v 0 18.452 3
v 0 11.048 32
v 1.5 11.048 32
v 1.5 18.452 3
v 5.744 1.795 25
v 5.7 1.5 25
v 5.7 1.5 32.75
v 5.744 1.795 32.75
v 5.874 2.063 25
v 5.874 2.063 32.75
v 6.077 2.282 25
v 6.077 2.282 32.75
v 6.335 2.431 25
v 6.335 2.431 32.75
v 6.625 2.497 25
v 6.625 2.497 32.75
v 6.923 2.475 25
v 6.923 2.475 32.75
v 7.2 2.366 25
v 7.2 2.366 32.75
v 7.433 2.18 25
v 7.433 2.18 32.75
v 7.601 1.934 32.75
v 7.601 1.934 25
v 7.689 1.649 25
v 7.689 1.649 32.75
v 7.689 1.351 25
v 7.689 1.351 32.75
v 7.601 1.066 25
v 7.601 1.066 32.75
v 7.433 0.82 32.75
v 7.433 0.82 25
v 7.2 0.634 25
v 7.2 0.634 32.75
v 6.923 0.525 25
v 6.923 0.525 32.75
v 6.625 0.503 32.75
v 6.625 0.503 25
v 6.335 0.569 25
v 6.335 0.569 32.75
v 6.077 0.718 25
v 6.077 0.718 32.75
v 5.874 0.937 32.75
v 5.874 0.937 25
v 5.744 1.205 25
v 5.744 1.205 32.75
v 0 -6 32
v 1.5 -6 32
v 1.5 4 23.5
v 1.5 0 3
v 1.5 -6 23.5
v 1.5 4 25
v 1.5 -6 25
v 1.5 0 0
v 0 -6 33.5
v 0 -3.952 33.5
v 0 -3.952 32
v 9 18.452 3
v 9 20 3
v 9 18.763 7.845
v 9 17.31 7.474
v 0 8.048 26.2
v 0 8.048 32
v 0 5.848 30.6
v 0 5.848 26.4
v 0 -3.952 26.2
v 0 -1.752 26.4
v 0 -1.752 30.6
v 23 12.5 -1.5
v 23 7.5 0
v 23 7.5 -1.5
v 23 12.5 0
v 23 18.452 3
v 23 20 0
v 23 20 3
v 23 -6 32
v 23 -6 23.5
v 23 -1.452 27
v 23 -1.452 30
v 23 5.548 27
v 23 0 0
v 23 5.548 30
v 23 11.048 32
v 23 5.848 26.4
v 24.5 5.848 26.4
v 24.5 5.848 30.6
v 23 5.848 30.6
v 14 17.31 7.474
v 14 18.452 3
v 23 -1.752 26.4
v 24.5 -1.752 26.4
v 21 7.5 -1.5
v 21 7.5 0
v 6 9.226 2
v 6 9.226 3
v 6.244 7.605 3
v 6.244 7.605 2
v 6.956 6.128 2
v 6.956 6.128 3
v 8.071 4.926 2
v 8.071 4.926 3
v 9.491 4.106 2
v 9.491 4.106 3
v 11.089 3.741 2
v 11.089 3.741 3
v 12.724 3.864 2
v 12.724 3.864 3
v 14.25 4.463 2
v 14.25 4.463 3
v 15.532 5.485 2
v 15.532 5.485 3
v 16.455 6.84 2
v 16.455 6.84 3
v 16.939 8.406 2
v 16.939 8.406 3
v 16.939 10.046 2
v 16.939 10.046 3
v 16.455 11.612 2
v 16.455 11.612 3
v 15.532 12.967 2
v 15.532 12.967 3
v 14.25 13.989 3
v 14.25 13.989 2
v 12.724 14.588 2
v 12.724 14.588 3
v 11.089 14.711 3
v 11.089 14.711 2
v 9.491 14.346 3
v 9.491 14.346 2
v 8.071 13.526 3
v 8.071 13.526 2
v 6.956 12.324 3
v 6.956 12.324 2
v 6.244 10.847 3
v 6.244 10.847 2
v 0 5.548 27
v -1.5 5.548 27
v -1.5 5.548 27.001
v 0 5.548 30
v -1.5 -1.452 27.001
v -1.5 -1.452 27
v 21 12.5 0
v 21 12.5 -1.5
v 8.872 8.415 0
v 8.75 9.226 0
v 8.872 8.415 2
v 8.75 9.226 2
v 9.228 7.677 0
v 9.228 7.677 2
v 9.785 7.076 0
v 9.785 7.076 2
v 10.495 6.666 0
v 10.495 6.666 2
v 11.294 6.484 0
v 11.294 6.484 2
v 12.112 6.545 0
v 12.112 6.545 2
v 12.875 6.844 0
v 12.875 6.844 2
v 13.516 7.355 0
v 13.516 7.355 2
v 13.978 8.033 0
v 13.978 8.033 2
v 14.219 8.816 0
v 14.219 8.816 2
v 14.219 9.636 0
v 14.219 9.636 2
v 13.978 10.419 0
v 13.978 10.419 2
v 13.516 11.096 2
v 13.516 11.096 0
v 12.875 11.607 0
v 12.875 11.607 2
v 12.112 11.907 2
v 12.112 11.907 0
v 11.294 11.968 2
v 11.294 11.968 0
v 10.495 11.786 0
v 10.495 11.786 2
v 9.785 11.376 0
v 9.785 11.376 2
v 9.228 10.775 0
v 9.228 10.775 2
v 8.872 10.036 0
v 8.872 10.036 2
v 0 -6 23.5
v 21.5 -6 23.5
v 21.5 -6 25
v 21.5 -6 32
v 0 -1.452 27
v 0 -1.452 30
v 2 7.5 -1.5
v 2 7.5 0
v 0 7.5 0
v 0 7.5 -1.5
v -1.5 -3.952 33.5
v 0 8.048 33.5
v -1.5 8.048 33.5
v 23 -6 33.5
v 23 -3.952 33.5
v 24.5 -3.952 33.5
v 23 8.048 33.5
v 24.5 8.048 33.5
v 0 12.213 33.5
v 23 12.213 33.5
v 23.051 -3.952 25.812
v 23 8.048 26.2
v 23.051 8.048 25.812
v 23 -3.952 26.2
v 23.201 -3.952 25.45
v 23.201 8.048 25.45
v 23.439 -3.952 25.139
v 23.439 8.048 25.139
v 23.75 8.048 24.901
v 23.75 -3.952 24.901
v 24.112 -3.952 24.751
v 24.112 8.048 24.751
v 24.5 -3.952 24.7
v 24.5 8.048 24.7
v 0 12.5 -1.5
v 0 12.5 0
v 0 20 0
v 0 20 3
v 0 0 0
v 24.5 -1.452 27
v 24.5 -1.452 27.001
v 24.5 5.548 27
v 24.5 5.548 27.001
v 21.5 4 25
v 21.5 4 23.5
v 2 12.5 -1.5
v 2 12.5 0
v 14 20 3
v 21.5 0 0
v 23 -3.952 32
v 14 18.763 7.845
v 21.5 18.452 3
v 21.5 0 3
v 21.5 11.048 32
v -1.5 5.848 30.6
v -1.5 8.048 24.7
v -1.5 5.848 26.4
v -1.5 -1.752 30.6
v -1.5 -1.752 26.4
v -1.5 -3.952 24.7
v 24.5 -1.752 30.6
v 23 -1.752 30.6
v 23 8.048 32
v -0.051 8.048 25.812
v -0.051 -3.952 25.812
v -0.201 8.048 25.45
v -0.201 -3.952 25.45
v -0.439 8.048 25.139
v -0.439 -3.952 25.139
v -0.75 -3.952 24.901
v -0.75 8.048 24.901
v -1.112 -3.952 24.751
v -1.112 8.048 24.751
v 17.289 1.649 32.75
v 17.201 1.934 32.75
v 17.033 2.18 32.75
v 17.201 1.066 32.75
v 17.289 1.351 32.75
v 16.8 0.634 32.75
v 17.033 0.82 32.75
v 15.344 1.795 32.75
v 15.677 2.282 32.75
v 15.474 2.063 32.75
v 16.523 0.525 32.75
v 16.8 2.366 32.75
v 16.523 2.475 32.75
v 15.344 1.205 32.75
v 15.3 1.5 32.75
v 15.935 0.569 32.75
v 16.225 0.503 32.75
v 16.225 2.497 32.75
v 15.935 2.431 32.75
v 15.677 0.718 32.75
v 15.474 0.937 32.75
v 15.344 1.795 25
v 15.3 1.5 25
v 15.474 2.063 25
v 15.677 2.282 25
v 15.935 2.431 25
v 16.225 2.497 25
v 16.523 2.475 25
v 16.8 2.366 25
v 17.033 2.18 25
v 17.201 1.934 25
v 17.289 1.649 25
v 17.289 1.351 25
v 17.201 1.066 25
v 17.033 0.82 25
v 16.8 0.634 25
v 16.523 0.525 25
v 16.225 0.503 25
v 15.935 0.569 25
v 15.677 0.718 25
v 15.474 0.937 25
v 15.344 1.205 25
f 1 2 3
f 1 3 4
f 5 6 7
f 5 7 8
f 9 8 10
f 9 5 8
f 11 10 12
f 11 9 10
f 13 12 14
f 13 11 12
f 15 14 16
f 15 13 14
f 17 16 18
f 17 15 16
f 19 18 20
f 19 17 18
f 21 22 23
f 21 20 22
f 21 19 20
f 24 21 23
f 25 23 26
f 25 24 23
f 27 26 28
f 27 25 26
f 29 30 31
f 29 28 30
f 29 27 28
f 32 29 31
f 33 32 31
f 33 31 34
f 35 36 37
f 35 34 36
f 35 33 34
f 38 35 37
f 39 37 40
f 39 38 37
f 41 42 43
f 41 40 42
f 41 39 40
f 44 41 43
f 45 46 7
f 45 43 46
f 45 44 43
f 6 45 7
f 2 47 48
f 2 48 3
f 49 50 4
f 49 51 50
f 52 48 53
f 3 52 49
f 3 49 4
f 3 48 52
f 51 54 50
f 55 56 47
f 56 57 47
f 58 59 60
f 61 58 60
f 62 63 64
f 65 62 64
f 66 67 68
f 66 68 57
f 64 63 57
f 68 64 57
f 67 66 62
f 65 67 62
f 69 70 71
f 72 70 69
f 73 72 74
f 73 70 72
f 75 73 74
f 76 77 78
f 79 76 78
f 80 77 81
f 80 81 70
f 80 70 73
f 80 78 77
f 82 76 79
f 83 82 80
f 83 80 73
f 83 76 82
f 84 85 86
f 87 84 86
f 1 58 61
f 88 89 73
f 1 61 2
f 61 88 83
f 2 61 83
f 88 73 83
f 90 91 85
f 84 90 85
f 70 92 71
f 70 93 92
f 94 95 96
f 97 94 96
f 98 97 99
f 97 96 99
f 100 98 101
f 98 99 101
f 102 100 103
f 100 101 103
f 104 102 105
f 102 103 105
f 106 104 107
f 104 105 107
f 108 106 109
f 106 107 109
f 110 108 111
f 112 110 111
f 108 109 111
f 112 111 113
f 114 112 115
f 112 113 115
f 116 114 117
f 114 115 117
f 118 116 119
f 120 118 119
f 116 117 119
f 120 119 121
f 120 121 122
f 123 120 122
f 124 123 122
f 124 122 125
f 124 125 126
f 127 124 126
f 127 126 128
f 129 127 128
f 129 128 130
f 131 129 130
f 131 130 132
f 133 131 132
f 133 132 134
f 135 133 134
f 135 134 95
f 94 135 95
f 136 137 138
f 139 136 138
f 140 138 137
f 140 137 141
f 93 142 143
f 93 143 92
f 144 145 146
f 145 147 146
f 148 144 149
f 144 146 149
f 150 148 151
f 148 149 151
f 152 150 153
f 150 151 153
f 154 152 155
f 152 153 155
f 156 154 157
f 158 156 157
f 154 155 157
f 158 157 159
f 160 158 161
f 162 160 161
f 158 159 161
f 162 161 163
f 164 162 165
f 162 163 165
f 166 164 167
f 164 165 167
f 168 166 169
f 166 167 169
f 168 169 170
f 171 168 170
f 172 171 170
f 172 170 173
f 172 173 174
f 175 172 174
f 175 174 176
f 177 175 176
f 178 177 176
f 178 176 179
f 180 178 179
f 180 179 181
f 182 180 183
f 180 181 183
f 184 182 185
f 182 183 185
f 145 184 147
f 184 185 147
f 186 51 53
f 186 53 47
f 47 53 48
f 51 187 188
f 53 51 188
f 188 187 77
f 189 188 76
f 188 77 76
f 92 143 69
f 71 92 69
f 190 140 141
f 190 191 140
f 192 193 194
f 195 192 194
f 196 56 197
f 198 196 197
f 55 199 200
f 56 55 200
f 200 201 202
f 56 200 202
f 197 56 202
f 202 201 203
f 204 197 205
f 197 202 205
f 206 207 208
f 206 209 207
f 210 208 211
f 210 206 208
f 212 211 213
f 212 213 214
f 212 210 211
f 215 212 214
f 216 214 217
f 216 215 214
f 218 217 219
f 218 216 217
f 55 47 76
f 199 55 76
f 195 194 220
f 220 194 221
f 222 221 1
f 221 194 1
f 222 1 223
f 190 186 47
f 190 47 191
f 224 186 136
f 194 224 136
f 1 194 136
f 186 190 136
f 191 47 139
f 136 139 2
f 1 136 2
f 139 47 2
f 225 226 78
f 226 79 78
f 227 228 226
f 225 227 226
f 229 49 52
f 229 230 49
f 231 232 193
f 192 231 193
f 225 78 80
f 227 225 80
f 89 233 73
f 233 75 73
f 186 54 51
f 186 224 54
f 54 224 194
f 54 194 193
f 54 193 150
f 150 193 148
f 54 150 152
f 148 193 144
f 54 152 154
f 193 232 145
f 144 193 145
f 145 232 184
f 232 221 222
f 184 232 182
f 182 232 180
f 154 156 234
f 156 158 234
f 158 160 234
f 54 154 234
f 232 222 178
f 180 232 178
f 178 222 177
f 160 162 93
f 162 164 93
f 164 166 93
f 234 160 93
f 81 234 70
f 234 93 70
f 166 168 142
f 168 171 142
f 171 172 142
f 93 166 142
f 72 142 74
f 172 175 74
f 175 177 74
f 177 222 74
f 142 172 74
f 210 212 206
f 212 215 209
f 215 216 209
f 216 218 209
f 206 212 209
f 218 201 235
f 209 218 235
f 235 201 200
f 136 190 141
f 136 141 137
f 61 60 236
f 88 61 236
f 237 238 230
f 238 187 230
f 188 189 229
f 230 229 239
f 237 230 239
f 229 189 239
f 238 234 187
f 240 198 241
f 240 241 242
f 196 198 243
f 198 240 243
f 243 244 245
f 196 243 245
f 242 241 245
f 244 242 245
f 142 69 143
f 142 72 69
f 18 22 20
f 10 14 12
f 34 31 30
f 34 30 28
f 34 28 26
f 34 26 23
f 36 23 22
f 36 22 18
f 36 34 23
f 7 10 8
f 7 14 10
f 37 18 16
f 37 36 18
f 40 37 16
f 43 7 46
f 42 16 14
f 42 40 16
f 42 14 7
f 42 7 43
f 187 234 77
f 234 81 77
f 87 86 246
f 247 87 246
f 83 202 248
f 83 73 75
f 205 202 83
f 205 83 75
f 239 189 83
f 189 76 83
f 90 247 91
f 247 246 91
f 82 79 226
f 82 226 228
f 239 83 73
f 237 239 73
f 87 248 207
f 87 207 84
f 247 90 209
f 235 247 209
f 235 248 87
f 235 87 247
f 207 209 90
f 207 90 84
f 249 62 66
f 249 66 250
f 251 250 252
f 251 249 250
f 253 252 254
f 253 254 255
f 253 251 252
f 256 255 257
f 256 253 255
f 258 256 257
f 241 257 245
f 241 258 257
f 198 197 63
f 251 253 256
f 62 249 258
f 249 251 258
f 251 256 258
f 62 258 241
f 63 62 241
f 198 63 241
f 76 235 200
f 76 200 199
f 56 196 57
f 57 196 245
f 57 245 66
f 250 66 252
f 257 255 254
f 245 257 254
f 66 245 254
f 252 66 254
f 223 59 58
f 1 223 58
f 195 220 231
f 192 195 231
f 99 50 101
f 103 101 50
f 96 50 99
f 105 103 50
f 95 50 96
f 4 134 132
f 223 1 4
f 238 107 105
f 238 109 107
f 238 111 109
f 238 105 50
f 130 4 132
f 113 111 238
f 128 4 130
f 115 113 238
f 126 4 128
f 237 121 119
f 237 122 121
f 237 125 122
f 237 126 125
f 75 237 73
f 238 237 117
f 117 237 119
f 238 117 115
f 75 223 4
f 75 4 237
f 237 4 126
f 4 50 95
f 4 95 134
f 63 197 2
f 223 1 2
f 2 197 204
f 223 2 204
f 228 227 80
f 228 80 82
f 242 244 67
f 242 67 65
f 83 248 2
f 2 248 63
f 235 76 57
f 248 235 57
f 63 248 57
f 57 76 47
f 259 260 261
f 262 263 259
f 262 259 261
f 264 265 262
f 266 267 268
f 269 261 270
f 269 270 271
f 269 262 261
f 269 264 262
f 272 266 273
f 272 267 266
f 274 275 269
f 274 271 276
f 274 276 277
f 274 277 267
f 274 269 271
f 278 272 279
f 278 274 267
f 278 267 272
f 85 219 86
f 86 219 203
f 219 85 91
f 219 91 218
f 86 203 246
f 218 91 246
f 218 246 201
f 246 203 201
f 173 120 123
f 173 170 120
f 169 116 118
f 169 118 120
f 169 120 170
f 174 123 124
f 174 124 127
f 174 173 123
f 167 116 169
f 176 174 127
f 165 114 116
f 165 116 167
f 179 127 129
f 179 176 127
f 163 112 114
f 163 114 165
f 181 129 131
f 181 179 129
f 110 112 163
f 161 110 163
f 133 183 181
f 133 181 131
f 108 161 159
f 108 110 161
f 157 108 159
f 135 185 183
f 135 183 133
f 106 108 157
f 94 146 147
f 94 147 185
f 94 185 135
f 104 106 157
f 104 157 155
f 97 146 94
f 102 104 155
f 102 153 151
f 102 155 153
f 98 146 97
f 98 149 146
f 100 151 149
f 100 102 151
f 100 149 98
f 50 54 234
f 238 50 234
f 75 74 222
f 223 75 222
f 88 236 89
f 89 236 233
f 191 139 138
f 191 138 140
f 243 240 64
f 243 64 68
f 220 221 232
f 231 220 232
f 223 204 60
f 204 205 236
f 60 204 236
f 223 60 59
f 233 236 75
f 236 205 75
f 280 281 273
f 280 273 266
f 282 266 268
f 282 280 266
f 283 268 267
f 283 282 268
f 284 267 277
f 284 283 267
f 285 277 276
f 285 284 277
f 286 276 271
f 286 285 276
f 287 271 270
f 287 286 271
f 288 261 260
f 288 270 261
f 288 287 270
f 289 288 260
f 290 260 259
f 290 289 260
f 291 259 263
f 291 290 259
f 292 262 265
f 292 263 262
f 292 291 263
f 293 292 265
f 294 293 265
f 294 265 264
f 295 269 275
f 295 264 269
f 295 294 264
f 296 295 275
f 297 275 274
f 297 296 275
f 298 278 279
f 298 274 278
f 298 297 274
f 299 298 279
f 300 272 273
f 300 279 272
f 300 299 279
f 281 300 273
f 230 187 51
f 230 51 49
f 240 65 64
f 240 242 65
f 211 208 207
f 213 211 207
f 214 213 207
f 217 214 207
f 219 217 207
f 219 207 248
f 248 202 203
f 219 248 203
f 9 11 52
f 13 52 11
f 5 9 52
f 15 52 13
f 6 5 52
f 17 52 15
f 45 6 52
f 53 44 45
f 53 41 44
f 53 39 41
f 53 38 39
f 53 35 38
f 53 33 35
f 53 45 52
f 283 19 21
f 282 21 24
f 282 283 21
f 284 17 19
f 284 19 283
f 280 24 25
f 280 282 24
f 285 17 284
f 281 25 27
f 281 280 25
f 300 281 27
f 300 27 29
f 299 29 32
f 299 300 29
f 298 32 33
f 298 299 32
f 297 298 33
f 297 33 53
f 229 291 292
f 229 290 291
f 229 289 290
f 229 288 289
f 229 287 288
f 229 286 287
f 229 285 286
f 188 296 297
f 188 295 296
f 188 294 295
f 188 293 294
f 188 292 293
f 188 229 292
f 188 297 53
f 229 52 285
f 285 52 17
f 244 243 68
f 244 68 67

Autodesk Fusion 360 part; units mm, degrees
sketch "Sketch1" plane through (0, 0, 0) normal (0, 0, 1) x (1, 0, 0) in component "Halterung"
  line L0 (0, 0) -> (23, 0)
  line L1 (23, 0) -> (23, 20)
  line L2 (23, 20) -> (0, 20)
  line L3 (0, 20) -> (0, 0)
  line L4 (0, 12.5) -> (2, 12.5)
  line L5 (2, 12.5) -> (2, 7.5)
  line L6 (2, 7.5) -> (0, 7.5)
  line L7 (0, 7.5) -> (0, 12.5)
  line L8 (11.5, 20) -> (11.5, 0) construction
  line L9 (23, 12.5) -> (21, 12.5)
  line L10 (21, 7.5) -> (23, 7.5)
  line L11 (21, 12.5) -> (21, 7.5)
  line L12 (23, 7.5) -> (23, 12.5)
  dimension "d1" = 20
  dimension "d2" = 23
  dimension "d5" = 2
  dimension "d6" = 5
extrude "Extrude1" add sketch "Sketch1" along normal blind 3 makes body 1 in component "Halterung"
extrude "Extrude2" add sketch "Sketch1" against normal blind 1.5 contours L3 L4 L5 L6 L7 | L1 L9 L10 L11 L12 bodies 1 in component "Halterung"
sketch "Sketch2" plane through (23, 0, 0) normal (1, 0, 0) x (0, 1, 0) in component "Halterung"
  line L0 (0, 0) -> (7.5, 0)
  line L1 (7.5, 0) -> (7.5, -1.5)
  line L2 (7.5, -1.5) -> (12.5, -1.5)
  line L3 (12.5, -1.5) -> (12.5, 0)
  line L4 (12.5, 0) -> (20, 0)
  line L5 (20, 0) -> (20, 3)
  line L6 (20, 3) -> (0, 3)
  line L7 (0, 3) -> (0, 0)
  line L8 (0, 0) -> (-6, 23.5)
  line L9 (-6, 23.5) -> (-6, 32)
  line L10 (-6, 32) -> (11.0476, 32)
  line L11 (11.0476, 32) -> (18.4971, 2.8228)
  dimension "d11" = 8.5
  dimension "d12" = 32
  dimension "d13" = 6
  dimension "d73" = 1.5
extrude "Extrude3" add sketch "Sketch2" against normal blind 1.5 contours L6 L7 L8 L9 L10 L11 bodies 1 in component "Halterung"
extrude "Extrude4" add sketch "Sketch2" along normal blind 1.5 from surface at -23 contours L6 L7 L8 L9 L10 L11 bodies 1 in component "Halterung"
sketch "Sketch3" plane through (21.5, 0, 0) normal (-1, 0, 0) x (0, -1, 0) in component "Halterung"
  line L0 (6, 32) -> (-11.0476, 32)
  line L1 (-11.0476, 32) -> (-18.4519, 3)
  line L2 (-18.4519, 3) -> (0, 3)
  line L3 (0, 3) -> (0, 0)
  line L4 (0, 0) -> (6, 23.5)
  line L5 (6, 23.5) -> (6, 32)
  line L6 (6, 23.5) -> (-4, 23.5)
  line L7 (-4, 23.5) -> (-4, 25)
  line L8 (-4, 25) -> (6, 25)
  line L9 (6, 25) -> (6, 23.5)
  dimension "d20" = 1.5
  dimension "d21" = 10
extrude "Extrude5" add sketch "Sketch3" along normal up to surface (20 mm away) contours L5 L6 L7 L8 L9 bodies 1 in component "Halterung"
sketch "Sketch4" plane through (0, 0, 25) normal (0, 0, 1) x (-1, 0, 0) in component "Halterung"
  line L0 (-1.5, -4) -> (-1.5, 6)
  line L1 (-1.5, 6) -> (-21.5, 6)
  line L2 (-21.5, 6) -> (-21.5, -4)
  line L3 (-21.5, -4) -> (-1.5, -4)
  circle A0 centre (-6.7, -1.5) radius 1
  line L4 (-11.5, 6) -> (-11.5, -4) construction
  line L5 (0, -11.0476) -> (0, 6)
  circle A1 centre (-16.3, -1.5) radius 1
  dimension "d24" = 2
  dimension "d25" = 6.5
  dimension "d74" = 4.2
  dimension "d75" = 8
extrude "Extrude6" add sketch "Sketch4" along normal up to surface (7.75 mm away) contours A0 | A1 bodies 1 in component "Halterung"
sketch "Sketch5" plane through (0, 0, 3) normal (0, 0, 1) x (-1, 0, 0) in component "Halterung"
  line L0 (-1.5, -18.4519) -> (-1.5, 0)
  line L1 (-1.5, 0) -> (-21.5, 0)
  line L2 (-21.5, 0) -> (-21.5, -18.4519)
  line L3 (-23, -20) -> (0, -20)
  circle A0 centre (-11.5, -9.2259) radius 5.5
  line L4 (-1.5, -9.2259) -> (-21.5, -9.2259) construction
  line L5 (-11.5, -20) -> (-11.5, 0) construction
  line L6 (0, -18.4519) -> (-1.5, -18.4519)
  line L7 (-21.5, -18.4519) -> (-23, -18.4519)
  line L8 (-23, -18.4519) -> (-23, -20)
  line L9 (0, -20) -> (0, -18.4519)
  point P0 (-11.5, -9.2259)
  dimension "d29" = 11
extrude "Extrude7" cut sketch "Sketch5" against normal blind 1 contours A0 bodies 1 in component "Halterung"
sketch "Sketch6" plane through (0, 0, 2) normal (0, 0, 1) x (-1, 0, 0) in component "Halterung"
  circle A0 centre (-11.5, -9.2259) radius 5.5
  circle A1 centre (-11.5, -9.2259) radius 2.75
  dimension "d32" = 5.5
extrude "Extrude8" cut sketch "Sketch6" against normal up to surface (2 mm away) contours A1 bodies 1 in component "Halterung"
sketch "Sketch7" plane through (0, 0, 0) normal (-1, 0, 0) x (0, -1, 0) in component "Halterung"
  line L0 (-20, 0) -> (-12.5, 0)
  line L1 (-12.5, 0) -> (-12.5, -1.5)
  line L2 (-12.5, -1.5) -> (-7.5, -1.5)
  line L3 (-7.5, -1.5) -> (-7.5, 0)
  line L4 (-7.5, 0) -> (0, 0)
  line L5 (0, 0) -> (6, 23.5)
  line L6 (6, 23.5) -> (6, 32)
  line L7 (6, 32) -> (-11.0476, 32)
  line L8 (-11.0476, 32) -> (-18.4519, 3)
  line L9 (-20, 3) -> (-20, 0)
  line L10 (-5.5476, 30) -> (1.4524, 30)
  line L11 (1.4524, 30) -> (1.4524, 27)
  line L12 (1.4524, 27) -> (-5.5476, 27)
  line L13 (-5.5476, 27) -> (-5.5476, 30)
  line L14 (-18.4519, 3) -> (-20, 3)
  dimension "d35" = 3
  dimension "d36" = 7
  dimension "d37" = 2
  dimension "d38" = 5.5
  dimension "d39" = 4.3
extrude "Extrude9" add sketch "Sketch7" along normal blind 1.5 contours L10 L11 L12 L13 bodies 1 in component "Halterung"
extrude "Extrude10" add sketch "Sketch7" against normal blind 1.5 from surface at -23 contours L10 L11 L12 L13 bodies 1 in component "Halterung"
chamfer "Chamfer1" distance 3 distance2 1.5 2 edges at (24.5, 2.0476, 30) (-1.5, 2.0476, 30) measured on face at (24.5, 3.2143, 29) measured on face at (-1.5, 3.2143, 29) on bodies 1 in component "Halterung"
sketch "Sketch1 (2)" plane through (0, 0, 32) normal (0, 0, 1) x (-1, 0, 0) in component "Klappe"
  line L0 (0, -11.0476) -> (0, 6)
  line L1 (0, 6) -> (-1.5, 6)
  line L2 (-1.5, 6) -> (-1.5, -11.0476)
  line L3 (-1.5, -11.0476) -> (0, -11.0476)
  line L4 (0, -11.0476) -> (-23, -11.0476)
  line L5 (-23, -11.0476) -> (-23, 6)
  line L6 (-23, 6) -> (0, 6)
  line L7 (0, 6) -> (0, -11.0476)
  line L8 (-21.5, 6) -> (-1.5, 6)
  line L9 (-23, 6) -> (-23, -11.0476)
  line L10 (0, -8.0476) -> (1.5, -8.0476)
  line L11 (1.5, -8.0476) -> (1.5, 3.9524)
  line L12 (1.5, 3.9524) -> (0, 3.9524)
  line L13 (0, 3.9524) -> (0, -8.0476)
  line L14 (0, -5.5476) -> (1.5, -5.5476)
  line L15 (1.5, 1.4524) -> (0, 1.4524)
  line L16 (1.5, -5.5476) -> (1.5, 1.4524)
  line L17 (-11.5, -11.0476) -> (-11.5, 6) construction
  line L18 (-23, -8.0476) -> (-24.5, -8.0476)
  line L19 (-24.5, -8.0476) -> (-24.5, 3.9524)
  line L20 (-24.5, 3.9524) -> (-23, 3.9524)
  line L21 (-23, 3.9524) -> (-23, -8.0476)
  dimension "d47" = 2.5
  dimension "d48" = 2.5
extrude "Extrude1'" add sketch "Sketch1 (2)" along normal blind 1.5 separate body makes body 2 in component "Klappe"
extrude "Extrude2'" add sketch "Sketch1 (2)" against normal up to surface (7.3 mm away) contours L5 L9 L18 L19 L20 L21 bodies 2 in component "Klappe"
extrude "Extrude3'" add sketch "Sketch1 (2)" against normal up to surface (7.3 mm away) contours L0 L7 L10 L11 L13 L14 | L0 L7 L11 L13 L14 L15 L16 | L0 L7 L11 L12 L13 L15 bodies 2 in component "Klappe"
sketch "Sketch2 (2)" plane through (-1.5, 0, 0) normal (-1, 0, 0) x (0, -1, 0) in component "Klappe"
  line L0 (3.9524, 24.7) -> (3.9524, 33.5)
  line L1 (3.9524, 33.5) -> (-8.0476, 33.5)
  line L2 (-8.0476, 33.5) -> (-8.0476, 24.7)
  line L3 (-8.0476, 24.7) -> (3.9524, 24.7)
  line L4 (-5.8476, 30.6) -> (1.7524, 30.6)
  line L5 (1.7524, 30.6) -> (1.7524, 26.4)
  line L6 (1.7524, 26.4) -> (-5.8476, 26.4)
  line L7 (-5.8476, 26.4) -> (-5.8476, 30.6)
  line L8 (-5.5476, 27) -> (1.4524, 27)
  line L9 (-5.5476, 30) -> (1.4524, 30)
  line L10 (1.4524, 27) -> (1.4524, 30)
  line L11 (-5.5476, 30) -> (-5.5476, 27)
  dimension "d55" = 0.6
  dimension "d56" = 0.6
  dimension "d57" = 0.3
  dimension "d58" = 0.3
extrude "Extrude4'" cut sketch "Sketch2 (2)" against normal up to surface (1.5 mm away) contours L4 L5 L6 L7 | L8 L9 L10 L11 bodies 2 in component "Klappe"
extrude "Extrude5'" cut sketch "Sketch2 (2)" along normal up to surface (1.5 mm away) from surface at -26 contours L4 L5 L6 L7 | L8 L9 L10 L11 bodies 2 in component "Klappe"
sketch "Sketch3 (2)" plane through (0, 0, 32) normal (0, 0, -1) x (1, 0, 0) in component "Klappe"
  line L0 (0, 3.9524) -> (0, -8.0476)
  line L1 (0, -8.0476) -> (0, -11.0476)
  line L2 (0, -11.0476) -> (23, -11.0476)
  line L3 (23, -11.0476) -> (23, -8.0476)
  line L4 (23, -8.0476) -> (23, 3.9524)
  line L5 (23, 3.9524) -> (23, 6)
  line L6 (23, 6) -> (0, 6)
  line L7 (0, 6) -> (0, 3.9524)
  circle A0 centre (6.7, -1.5) radius 1 construction
  circle A1 centre (6.7, -1.5) radius 1.2
  circle A2 centre (16.3, -1.5) radius 1 construction
  circle A3 centre (16.3, -1.5) radius 1.2
  dimension "d65" = 0.2
  dimension "d66" = 0.2
extrude "Extrude11" [suppressed] in component "Halterung"
fillet "Fillet1" radius 1.5 2 edges at (0, 2.0476, 24.7) (23, 2.0476, 24.7) on bodies 2 in component "Klappe"
sketch "Sketch4 (2)" plane through (23, 0, 0) normal (1, 0, 0) x (0, 1, 0) in component "Klappe"
  line L0 (8.0476, 32) -> (11.0476, 32)
  line L1 (11.0476, 32) -> (11.0476, 33.5)
  line L2 (11.0476, 33.5) -> (8.0476, 33.5)
  line L3 (8.0476, 33.5) -> (8.0476, 32)
  line L4 (18.4519, 3) -> (11.0476, 32)
  line L5 (11.0476, 32) -> (11.0476, 33.5)
  line L6 (11.0476, 33.5) -> (12.2128, 33.5)
  line L7 (12.2128, 33.5) -> (20, 3)
  line L8 (20, 3) -> (18.4519, 3)
  line L9 (11.0476, 32) -> (18.4519, 3)
  line L10 (18.4519, 3) -> (20, 3)
  line L11 (11.0476, 32) -> (11.0476, 33.5)
extrude "Extrude7'" add sketch "Sketch4 (2)" against normal up to surface (23 mm away) contours L1 L4 L5 L6 L7 L8 L9 L10 L11 bodies 2 in component "Klappe"
sketch "Sketch5 (2)" plane through (0, 19.4951, 4.9775) normal (0, 0.9689, 0.2474) x (-1, 0, 0) in component "Klappe"
  line L0 (0, -2.0409) -> (0, 29.4375)
  line L1 (0, 29.4375) -> (-23, 29.4375)
  line L2 (-23, 29.4375) -> (-23, -2.0409)
  line L3 (-23, -2.0409) -> (0, -2.0409)
  line L4 (-14, -2.0409) -> (-9, -2.0409)
  line L5 (-9, -2.0409) -> (-9, 2.9591)
  line L6 (-9, 2.9591) -> (-14, 2.9591)
  line L7 (-14, 2.9591) -> (-14, -2.0409)
  dimension "d78" = 5
  dimension "d79" = 5
extrude "Extrude8'" cut sketch "Sketch5 (2)" against normal up to surface (1.5 mm away) contours L3 L4 L5 L6 L7 bodies 2 in component "Klappe"
component "Halterung" placed x (1, 0, 0) y (0, 1, 0) z (0, 0, 1) at (0, 0, 0)
component "Klappe" placed x (1, 0, 0) y (0, 1, 0) z (0, 0, 1) at (0, 0, 0)
